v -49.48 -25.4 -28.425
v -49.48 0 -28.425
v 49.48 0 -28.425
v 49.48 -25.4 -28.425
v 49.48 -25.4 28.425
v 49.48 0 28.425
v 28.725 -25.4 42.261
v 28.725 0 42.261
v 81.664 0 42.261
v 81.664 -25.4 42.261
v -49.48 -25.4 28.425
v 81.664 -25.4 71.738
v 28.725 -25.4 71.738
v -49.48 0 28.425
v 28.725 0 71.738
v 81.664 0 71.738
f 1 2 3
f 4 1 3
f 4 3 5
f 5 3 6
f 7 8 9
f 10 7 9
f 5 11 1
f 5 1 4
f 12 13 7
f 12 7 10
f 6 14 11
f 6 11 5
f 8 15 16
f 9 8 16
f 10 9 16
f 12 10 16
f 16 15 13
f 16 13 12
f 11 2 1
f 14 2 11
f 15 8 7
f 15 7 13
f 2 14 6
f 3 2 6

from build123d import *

# Parameters (mm, degrees)
F2_W     = 98.959736
F2_H     = 56.849208
F1_W     = 52.938946
F1_H     = 29.477358
F3_DEPTH = 25.4


with BuildPart() as f3:
    # F2 (on face) + F1 (on Front) → F3 (new body)
    with BuildSketch(Plane.XZ):
        Rectangle(F2_W, F2_H)
    with BuildSketch(Plane.XZ):
        with Locations((55.194866, 56.999609)):
            Rectangle(F1_W, F1_H)
    extrude(amount=F3_DEPTH)


solid = f3.part
